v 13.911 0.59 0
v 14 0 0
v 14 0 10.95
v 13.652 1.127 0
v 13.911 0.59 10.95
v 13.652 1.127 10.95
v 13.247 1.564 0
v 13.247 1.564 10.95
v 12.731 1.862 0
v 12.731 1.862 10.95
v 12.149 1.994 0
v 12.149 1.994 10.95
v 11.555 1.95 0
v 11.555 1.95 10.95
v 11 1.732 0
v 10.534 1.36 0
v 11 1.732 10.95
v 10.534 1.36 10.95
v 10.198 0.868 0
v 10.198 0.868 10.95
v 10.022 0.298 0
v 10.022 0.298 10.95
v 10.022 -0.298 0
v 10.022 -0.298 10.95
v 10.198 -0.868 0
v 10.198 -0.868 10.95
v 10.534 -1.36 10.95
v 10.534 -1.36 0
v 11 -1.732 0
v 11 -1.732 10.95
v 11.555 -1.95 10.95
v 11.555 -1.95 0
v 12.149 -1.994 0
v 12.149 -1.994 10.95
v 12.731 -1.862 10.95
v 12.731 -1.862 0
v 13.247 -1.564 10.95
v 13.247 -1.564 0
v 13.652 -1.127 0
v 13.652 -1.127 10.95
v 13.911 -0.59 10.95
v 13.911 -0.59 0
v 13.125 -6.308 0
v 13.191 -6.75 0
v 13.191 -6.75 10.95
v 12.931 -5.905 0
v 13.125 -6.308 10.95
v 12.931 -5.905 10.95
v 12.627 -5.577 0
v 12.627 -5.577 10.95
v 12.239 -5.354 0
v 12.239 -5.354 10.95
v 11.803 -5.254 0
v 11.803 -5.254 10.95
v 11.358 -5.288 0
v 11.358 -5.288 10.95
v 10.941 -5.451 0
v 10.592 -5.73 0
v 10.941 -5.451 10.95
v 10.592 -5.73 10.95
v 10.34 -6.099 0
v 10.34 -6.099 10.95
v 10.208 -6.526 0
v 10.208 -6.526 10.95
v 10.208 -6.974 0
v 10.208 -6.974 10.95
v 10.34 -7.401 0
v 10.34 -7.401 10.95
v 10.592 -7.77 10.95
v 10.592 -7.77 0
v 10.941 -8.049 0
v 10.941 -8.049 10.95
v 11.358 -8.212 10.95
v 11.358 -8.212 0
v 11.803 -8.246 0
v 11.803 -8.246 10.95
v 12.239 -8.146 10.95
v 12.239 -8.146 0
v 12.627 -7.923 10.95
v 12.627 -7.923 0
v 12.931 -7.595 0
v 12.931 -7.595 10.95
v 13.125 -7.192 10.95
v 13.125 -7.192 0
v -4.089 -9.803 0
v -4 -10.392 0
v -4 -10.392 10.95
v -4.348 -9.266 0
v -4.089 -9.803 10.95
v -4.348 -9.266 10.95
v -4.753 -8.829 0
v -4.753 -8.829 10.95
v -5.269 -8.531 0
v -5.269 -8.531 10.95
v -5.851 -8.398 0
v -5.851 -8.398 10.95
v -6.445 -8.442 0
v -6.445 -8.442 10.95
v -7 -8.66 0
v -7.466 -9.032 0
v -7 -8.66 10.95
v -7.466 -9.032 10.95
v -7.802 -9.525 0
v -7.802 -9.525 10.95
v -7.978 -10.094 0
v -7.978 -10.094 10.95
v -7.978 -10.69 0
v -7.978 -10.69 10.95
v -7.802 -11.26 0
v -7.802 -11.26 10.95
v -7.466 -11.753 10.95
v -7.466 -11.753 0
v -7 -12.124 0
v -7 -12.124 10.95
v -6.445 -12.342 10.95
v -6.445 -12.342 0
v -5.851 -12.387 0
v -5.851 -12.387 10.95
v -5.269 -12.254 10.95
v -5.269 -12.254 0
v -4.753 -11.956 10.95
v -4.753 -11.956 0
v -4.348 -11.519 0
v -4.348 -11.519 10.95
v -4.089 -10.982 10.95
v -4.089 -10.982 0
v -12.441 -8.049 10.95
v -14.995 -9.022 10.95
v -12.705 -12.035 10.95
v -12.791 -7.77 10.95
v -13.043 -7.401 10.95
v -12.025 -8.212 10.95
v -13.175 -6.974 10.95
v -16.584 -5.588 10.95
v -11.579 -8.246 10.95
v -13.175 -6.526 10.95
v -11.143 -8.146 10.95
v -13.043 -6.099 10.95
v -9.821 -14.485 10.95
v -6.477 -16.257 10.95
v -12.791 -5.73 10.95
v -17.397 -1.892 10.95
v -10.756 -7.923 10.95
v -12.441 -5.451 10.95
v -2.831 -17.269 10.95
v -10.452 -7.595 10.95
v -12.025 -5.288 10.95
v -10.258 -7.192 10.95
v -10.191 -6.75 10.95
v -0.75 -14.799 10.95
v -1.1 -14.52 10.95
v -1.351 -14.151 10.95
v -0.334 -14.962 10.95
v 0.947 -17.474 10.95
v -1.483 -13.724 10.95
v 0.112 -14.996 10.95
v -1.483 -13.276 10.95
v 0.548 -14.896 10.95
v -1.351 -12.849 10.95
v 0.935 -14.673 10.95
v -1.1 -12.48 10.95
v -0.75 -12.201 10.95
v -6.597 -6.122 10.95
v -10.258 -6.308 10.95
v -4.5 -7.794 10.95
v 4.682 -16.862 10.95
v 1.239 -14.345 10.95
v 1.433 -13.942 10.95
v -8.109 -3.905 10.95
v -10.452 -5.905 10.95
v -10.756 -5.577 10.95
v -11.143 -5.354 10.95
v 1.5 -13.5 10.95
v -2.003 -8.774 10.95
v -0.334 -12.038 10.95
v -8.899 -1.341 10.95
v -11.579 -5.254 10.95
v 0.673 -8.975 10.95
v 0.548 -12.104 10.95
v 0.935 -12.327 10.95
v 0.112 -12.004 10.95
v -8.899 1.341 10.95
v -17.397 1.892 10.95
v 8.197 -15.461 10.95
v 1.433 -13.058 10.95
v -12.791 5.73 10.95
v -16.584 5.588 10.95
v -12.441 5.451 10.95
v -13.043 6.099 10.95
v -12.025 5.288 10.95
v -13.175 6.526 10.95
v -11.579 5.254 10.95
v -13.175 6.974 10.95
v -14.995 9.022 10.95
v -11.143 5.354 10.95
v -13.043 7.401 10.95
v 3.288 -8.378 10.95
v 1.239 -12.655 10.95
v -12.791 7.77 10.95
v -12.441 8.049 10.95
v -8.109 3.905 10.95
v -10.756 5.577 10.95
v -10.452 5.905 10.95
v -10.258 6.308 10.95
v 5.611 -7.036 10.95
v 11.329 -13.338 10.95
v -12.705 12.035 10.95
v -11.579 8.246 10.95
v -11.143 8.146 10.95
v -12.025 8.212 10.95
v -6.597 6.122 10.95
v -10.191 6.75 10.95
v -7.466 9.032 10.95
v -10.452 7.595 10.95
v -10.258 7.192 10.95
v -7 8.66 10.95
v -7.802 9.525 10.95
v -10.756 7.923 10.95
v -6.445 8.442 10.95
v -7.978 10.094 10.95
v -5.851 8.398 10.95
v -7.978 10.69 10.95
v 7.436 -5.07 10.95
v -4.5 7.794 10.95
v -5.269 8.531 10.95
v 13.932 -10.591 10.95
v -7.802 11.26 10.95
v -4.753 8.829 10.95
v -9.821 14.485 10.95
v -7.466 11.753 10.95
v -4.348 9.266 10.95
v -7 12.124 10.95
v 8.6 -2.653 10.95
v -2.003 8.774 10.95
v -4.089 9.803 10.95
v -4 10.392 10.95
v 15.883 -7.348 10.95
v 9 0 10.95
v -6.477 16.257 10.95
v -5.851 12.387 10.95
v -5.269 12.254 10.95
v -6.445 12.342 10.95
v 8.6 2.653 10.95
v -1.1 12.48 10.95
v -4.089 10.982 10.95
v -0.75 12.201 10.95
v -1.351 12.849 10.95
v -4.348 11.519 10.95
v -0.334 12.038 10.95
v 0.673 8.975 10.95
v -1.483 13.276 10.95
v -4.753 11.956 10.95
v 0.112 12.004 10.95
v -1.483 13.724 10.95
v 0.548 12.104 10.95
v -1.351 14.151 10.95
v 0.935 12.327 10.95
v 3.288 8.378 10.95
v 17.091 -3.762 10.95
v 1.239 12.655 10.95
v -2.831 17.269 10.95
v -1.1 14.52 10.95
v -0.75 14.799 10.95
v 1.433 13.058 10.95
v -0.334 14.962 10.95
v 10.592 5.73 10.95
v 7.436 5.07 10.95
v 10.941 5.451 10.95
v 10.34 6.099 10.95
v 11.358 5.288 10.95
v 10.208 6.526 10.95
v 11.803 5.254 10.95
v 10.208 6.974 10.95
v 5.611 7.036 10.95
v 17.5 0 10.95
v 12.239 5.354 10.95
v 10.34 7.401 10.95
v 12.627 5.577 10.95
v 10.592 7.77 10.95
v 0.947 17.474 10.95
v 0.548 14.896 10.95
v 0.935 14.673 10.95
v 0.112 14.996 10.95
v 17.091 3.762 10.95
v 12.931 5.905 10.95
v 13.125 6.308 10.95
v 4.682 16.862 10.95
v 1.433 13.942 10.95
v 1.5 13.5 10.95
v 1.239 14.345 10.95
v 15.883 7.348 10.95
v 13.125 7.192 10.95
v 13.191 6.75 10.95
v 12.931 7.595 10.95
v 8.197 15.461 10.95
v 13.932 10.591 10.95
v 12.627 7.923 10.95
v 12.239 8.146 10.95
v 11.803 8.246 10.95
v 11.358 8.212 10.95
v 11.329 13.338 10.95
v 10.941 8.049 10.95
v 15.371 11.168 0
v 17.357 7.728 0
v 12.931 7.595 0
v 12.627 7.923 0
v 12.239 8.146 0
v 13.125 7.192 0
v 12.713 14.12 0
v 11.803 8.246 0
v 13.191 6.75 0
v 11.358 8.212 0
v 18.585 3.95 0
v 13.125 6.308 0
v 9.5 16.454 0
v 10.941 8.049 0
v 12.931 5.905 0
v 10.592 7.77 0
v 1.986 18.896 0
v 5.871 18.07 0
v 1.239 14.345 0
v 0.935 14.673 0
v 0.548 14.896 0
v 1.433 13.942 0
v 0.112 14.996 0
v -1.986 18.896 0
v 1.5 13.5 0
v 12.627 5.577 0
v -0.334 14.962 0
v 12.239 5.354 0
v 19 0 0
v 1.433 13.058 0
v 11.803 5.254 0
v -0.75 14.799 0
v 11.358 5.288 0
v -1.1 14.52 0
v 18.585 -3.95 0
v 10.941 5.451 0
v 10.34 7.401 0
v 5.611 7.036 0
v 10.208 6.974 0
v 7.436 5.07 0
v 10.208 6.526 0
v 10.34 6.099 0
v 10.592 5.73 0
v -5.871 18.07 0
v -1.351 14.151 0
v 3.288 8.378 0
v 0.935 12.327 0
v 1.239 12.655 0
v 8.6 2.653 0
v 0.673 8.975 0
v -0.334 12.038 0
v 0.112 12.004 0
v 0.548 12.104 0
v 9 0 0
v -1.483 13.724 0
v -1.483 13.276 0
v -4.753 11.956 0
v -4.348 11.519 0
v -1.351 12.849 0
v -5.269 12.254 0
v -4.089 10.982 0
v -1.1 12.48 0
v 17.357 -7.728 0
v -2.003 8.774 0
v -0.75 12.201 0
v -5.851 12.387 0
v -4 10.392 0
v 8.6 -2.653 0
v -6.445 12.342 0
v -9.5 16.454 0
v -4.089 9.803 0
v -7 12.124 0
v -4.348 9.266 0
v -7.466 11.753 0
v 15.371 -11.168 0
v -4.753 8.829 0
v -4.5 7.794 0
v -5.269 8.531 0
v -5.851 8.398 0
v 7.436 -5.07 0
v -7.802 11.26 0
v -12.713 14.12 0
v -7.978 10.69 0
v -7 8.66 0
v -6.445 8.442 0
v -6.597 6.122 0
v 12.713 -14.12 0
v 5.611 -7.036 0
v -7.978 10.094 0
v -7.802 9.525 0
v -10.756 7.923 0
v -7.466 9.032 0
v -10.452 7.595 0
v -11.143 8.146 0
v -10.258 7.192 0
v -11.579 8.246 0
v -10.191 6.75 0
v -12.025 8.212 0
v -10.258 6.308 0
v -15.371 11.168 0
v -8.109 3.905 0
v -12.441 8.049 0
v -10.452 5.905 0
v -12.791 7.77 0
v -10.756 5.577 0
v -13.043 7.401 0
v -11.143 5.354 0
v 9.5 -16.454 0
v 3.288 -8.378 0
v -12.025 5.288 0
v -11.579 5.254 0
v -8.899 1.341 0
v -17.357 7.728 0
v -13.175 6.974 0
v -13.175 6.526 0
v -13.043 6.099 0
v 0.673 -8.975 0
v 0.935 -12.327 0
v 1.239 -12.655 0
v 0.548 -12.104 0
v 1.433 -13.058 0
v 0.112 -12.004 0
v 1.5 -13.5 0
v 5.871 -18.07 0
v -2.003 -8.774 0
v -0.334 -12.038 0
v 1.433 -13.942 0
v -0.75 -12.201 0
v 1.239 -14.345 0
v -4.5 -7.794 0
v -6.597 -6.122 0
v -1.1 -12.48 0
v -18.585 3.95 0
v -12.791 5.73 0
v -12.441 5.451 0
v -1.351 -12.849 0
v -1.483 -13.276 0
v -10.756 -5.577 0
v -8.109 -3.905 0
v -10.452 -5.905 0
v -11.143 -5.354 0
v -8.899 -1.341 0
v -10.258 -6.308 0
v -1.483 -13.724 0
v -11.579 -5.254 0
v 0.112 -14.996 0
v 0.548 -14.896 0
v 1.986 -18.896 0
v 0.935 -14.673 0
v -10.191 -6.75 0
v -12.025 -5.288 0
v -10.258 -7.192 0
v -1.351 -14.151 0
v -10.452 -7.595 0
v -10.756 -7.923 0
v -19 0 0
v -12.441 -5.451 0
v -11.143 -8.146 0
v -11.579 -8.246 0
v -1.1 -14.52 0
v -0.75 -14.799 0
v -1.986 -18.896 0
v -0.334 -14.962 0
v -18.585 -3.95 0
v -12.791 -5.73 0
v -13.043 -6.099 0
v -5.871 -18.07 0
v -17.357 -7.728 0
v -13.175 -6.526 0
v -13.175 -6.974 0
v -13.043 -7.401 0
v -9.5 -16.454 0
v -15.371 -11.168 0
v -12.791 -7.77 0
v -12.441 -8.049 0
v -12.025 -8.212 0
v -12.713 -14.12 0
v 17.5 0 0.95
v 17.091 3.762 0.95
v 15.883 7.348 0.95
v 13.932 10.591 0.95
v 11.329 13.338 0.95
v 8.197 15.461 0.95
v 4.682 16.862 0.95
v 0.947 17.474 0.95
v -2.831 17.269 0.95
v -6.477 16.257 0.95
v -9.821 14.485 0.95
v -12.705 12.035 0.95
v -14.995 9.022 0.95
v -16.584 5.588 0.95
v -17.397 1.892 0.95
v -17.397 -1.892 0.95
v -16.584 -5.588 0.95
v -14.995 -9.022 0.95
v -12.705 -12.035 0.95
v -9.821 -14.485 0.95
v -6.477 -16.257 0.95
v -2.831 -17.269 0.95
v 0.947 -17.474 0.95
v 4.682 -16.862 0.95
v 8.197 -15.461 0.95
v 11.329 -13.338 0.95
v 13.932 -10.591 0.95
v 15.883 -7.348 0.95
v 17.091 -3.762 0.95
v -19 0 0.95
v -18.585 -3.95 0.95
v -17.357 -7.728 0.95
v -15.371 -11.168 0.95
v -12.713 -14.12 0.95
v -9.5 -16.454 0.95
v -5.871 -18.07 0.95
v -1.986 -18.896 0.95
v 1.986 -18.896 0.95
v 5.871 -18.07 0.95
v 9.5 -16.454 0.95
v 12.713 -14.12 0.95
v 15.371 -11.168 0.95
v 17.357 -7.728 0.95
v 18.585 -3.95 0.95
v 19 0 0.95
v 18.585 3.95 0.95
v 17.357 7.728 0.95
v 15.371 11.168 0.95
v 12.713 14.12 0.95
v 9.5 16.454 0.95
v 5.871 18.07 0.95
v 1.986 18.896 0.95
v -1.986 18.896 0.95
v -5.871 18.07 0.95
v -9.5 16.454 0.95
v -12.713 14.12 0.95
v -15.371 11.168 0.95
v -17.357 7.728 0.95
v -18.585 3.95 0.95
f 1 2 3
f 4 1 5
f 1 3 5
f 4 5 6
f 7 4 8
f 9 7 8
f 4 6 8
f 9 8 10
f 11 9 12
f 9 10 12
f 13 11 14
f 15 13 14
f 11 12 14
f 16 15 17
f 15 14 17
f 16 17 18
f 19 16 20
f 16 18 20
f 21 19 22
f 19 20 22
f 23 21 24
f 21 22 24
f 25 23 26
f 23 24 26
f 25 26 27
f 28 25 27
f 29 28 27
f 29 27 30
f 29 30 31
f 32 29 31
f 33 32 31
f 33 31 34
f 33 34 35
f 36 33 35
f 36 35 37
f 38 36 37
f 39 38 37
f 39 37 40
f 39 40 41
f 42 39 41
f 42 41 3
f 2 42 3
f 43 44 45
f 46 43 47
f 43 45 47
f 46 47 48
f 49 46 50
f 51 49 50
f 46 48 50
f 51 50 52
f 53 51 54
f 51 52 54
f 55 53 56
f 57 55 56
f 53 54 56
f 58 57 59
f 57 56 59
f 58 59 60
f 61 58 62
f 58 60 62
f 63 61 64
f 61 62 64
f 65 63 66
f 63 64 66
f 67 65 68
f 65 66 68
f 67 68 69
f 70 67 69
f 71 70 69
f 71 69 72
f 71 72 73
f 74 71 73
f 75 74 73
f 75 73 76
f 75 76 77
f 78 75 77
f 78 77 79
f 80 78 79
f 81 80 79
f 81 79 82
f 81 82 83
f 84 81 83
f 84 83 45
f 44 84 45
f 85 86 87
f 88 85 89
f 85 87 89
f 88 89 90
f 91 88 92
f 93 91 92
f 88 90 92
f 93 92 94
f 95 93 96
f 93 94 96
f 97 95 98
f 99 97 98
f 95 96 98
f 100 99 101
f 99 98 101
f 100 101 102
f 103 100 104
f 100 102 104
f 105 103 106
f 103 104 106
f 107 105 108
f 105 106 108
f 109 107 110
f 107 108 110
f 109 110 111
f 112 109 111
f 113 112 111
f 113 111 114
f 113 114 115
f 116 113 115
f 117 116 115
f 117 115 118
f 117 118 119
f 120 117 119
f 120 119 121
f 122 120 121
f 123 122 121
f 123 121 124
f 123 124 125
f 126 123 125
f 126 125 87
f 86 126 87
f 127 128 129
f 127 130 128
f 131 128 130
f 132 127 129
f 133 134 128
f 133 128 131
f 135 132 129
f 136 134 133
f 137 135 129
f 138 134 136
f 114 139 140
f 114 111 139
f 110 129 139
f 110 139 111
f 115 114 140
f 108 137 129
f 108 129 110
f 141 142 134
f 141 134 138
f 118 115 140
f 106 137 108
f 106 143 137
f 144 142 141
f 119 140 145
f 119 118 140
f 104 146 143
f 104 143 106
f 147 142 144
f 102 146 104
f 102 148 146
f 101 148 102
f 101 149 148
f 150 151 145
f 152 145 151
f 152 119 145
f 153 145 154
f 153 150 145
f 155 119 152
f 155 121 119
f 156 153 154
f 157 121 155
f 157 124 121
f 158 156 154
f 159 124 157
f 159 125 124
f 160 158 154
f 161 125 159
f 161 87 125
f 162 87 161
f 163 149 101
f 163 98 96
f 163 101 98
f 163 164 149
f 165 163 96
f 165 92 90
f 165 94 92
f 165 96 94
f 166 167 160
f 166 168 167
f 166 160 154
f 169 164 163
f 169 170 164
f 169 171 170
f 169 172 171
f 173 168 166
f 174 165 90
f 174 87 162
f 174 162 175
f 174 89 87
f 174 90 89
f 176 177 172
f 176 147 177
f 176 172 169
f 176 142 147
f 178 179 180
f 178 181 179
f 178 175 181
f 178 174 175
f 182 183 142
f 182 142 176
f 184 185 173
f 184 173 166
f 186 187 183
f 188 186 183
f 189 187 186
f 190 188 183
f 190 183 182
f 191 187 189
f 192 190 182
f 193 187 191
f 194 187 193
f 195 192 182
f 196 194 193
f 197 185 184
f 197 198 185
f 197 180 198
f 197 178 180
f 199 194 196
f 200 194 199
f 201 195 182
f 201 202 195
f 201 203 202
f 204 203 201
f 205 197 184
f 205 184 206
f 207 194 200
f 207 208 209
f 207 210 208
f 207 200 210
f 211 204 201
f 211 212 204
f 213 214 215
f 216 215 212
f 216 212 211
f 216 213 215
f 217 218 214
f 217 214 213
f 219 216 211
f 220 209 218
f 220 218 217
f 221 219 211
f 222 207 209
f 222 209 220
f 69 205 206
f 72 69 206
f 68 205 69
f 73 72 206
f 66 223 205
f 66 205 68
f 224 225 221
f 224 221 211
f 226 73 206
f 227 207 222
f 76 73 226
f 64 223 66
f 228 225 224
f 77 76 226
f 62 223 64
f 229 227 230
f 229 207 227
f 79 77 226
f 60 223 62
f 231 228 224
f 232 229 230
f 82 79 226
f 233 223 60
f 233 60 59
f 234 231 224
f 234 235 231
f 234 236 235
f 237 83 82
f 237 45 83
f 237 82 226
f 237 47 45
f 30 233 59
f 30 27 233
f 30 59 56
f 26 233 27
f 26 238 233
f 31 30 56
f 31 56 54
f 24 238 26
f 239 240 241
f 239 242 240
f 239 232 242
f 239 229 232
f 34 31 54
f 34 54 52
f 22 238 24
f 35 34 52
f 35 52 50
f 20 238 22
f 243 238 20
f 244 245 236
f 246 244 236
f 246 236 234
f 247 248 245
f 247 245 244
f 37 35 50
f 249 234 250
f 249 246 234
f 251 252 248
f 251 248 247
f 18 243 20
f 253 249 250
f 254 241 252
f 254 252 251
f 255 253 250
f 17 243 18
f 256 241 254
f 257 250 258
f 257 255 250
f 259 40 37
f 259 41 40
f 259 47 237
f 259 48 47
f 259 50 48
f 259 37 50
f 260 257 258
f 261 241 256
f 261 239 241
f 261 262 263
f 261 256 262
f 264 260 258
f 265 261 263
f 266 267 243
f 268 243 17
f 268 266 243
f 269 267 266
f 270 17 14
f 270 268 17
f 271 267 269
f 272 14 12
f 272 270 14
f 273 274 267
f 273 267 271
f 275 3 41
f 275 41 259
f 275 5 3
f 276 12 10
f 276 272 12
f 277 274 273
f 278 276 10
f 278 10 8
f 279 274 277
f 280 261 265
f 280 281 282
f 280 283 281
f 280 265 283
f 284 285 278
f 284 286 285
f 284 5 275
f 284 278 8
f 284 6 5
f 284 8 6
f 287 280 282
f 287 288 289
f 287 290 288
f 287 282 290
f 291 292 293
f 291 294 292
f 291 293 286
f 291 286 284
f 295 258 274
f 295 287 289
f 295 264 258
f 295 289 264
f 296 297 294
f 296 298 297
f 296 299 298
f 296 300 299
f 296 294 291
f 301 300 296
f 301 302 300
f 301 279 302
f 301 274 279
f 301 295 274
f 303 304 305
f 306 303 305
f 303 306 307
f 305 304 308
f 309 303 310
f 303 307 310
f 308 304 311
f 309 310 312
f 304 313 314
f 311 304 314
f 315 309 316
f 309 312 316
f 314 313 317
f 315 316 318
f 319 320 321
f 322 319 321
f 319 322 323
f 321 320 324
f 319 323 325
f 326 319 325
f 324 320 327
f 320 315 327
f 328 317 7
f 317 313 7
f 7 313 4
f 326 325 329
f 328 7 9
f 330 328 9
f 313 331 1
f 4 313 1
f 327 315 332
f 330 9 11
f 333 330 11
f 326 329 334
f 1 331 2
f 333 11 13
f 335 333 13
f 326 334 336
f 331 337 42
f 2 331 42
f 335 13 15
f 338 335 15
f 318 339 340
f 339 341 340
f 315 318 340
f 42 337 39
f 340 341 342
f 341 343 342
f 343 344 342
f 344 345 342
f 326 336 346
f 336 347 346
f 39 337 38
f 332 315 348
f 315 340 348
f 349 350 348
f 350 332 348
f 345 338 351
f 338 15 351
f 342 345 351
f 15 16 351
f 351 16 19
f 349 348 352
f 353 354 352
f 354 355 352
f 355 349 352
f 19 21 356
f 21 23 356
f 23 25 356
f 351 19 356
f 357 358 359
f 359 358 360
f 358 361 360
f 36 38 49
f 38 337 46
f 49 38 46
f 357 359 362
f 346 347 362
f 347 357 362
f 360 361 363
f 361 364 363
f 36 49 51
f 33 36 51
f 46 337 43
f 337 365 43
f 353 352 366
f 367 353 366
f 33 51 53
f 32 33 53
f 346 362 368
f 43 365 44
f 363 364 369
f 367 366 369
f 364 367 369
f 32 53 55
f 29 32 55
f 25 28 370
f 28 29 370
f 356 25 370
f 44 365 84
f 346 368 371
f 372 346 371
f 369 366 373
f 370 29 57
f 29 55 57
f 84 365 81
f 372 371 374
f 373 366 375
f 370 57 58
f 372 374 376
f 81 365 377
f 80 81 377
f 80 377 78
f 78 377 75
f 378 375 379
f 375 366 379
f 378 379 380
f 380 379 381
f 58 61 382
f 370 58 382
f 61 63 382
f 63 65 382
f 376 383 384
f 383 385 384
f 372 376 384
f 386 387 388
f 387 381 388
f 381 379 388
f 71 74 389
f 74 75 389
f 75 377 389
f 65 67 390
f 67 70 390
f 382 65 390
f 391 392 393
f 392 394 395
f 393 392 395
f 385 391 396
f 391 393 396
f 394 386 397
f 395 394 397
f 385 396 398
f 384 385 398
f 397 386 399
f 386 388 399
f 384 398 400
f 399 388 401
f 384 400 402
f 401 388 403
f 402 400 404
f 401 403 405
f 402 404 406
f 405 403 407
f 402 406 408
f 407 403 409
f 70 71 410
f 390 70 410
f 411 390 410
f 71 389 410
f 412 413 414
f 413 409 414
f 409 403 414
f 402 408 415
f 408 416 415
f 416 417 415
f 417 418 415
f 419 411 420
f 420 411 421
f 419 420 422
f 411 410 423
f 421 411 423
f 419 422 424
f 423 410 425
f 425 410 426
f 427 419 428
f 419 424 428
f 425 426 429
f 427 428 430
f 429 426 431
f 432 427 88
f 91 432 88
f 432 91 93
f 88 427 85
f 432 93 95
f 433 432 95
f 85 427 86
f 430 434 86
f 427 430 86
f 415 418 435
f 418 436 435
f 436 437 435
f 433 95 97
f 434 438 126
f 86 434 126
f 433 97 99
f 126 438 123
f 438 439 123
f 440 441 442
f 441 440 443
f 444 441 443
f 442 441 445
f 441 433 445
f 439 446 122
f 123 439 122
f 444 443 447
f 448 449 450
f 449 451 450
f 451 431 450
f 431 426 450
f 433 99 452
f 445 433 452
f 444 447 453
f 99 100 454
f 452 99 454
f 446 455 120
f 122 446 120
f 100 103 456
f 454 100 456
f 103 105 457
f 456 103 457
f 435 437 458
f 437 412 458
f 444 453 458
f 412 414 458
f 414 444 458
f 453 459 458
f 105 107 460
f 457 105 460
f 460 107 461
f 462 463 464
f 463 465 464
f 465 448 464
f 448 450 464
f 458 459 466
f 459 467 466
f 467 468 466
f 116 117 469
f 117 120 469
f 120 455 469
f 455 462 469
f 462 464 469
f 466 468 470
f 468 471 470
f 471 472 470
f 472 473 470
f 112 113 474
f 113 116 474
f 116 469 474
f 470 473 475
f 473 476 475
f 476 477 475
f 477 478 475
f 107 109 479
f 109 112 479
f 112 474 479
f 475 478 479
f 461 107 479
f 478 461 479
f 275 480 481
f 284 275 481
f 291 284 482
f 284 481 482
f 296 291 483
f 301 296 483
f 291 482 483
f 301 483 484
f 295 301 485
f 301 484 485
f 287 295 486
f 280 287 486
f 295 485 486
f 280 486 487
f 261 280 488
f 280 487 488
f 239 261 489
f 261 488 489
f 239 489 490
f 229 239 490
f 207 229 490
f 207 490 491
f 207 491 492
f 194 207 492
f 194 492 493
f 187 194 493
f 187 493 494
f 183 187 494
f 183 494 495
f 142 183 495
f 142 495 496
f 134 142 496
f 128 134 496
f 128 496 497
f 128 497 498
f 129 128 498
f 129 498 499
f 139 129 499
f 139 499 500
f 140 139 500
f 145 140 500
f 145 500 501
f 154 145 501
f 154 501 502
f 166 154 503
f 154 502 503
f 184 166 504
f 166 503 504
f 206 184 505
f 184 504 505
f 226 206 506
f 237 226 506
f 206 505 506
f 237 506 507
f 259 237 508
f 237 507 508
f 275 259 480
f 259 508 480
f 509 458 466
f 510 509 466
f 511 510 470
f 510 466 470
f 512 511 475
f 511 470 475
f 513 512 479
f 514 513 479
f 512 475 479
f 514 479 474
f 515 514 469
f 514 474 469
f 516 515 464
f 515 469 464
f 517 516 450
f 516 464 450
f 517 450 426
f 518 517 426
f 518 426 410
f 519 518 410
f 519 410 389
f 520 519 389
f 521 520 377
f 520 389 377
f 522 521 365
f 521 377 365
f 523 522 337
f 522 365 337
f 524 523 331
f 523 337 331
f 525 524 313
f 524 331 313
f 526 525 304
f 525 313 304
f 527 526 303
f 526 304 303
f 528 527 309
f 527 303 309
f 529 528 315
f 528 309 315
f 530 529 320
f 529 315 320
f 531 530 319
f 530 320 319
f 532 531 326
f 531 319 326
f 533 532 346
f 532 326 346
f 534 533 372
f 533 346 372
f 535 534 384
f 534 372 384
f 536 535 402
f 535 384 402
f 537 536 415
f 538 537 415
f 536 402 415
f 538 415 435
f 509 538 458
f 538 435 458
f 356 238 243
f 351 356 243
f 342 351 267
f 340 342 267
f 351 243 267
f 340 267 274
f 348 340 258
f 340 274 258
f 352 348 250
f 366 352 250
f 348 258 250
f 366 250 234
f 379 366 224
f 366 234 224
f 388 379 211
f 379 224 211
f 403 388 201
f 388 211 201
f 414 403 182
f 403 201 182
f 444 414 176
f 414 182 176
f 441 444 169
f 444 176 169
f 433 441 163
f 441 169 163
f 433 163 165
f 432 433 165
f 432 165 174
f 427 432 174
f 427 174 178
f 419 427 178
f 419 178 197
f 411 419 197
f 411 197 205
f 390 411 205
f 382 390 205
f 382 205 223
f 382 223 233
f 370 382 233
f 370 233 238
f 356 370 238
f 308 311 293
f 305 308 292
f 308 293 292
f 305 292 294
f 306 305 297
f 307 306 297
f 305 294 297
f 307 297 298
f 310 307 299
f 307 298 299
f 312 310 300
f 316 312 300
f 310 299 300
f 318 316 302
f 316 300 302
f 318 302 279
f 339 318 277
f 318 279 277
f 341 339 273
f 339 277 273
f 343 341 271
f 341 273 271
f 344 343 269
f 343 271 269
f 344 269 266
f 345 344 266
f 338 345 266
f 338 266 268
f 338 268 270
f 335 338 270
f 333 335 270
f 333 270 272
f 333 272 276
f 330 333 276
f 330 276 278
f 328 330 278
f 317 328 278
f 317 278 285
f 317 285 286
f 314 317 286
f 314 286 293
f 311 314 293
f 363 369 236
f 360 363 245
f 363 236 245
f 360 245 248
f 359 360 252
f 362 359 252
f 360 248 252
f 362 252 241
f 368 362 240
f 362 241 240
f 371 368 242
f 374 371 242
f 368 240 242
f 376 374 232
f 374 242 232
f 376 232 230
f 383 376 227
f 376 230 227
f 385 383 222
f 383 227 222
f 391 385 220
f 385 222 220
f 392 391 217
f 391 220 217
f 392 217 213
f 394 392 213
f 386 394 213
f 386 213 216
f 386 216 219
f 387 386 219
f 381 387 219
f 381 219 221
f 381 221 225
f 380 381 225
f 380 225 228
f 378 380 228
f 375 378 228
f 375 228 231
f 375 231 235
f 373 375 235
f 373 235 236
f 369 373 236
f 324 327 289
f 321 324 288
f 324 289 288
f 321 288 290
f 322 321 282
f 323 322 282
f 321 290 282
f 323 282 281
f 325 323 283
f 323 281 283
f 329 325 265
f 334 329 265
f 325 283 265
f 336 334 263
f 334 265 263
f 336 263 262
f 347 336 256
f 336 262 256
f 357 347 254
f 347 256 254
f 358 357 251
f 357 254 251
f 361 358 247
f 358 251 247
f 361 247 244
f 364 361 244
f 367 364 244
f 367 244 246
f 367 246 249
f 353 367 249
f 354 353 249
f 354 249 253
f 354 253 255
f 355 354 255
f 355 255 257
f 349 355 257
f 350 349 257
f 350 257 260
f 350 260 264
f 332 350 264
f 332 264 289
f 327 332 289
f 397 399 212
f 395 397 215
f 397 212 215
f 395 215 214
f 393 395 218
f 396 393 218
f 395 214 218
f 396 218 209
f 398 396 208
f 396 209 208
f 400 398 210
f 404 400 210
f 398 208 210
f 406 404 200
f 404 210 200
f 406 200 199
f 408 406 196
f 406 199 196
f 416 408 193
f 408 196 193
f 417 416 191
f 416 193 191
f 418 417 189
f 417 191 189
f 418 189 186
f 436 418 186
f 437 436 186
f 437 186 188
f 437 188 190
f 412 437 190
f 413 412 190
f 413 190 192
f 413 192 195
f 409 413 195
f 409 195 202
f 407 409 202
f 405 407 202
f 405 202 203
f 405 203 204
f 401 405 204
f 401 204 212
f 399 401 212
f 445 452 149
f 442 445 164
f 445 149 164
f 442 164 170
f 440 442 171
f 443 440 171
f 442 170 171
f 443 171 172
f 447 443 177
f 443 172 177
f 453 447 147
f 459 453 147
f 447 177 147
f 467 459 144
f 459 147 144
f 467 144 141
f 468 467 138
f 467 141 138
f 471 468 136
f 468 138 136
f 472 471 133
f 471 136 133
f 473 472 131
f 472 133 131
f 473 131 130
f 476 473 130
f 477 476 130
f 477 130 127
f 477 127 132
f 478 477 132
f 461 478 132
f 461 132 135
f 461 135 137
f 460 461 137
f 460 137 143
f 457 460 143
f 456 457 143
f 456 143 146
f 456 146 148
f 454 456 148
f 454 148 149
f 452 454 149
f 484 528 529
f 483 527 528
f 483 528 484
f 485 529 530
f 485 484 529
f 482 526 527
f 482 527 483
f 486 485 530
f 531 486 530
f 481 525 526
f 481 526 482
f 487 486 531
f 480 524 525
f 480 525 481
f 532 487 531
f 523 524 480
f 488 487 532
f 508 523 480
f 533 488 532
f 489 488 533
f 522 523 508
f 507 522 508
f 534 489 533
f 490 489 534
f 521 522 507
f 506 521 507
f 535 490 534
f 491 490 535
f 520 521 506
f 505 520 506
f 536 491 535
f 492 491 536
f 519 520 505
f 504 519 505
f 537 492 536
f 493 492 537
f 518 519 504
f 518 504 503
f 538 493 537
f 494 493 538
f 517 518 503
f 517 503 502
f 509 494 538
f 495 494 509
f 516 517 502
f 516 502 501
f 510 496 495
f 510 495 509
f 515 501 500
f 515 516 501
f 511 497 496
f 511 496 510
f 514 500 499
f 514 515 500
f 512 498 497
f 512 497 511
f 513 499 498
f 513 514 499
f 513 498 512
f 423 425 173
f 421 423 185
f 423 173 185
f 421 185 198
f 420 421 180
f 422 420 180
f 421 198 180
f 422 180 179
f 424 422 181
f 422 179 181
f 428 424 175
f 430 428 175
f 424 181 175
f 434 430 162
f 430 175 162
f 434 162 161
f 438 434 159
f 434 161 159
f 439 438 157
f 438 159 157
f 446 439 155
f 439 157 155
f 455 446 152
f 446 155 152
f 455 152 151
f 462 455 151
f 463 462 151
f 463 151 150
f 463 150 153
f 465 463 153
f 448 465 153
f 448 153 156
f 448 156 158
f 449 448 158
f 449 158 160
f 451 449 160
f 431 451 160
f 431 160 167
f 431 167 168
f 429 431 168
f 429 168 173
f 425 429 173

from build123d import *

# Parameters (mm, degrees)
SKETCH_1_R          = 17.5
EXTRUDE_1_DEPTH     = 10.95
SKETCH_1_4_R        = 19
SKETCH_1_4_R_2      = 17.5
EXTRUDE_2_DEPTH     = 0.95
SKETCH_2_R          = 9
SKETCH_2_R_2        = 1.5
SKETCH_2_R_3        = 2
CUT_EXTRUDE_1_DEPTH = 30.015556173


with BuildPart() as part:
    # 草图1 → 凸台-拉伸1 (new body)
    with BuildSketch(Plane.XY):
        Circle(SKETCH_1_R)
    extrude(amount=EXTRUDE_1_DEPTH)

    # 草图1<4> → 凸台-拉伸2 (add)
    with BuildSketch(Plane.XY):
        Circle(SKETCH_1_4_R)
        Circle(SKETCH_1_4_R_2, mode=Mode.SUBTRACT)
    extrude(amount=EXTRUDE_2_DEPTH)

    # 草图2 → 切除-拉伸1 (cut, through all)
    with BuildSketch(Plane.XY.offset(10.95)):
        Circle(SKETCH_2_R)
        with Locations((0, 13.5)):
            Circle(SKETCH_2_R_2)
        with Locations((11.691342951, 6.75)):
            Circle(SKETCH_2_R_2)
        with Locations((11.691342951, -6.75)):
            Circle(SKETCH_2_R_2)
        with Locations((0, -13.5)):
            Circle(SKETCH_2_R_2)
        with Locations((-11.691342951, -6.75)):
            Circle(SKETCH_2_R_2)
        with Locations((-11.691342951, 6.75)):
            Circle(SKETCH_2_R_2)
        with Locations((12, 0)):
            Circle(SKETCH_2_R_3)
        with Locations((-6, -10.392304845)):
            Circle(SKETCH_2_R_3)
        with Locations((-6, 10.392304845)):
            Circle(SKETCH_2_R_3)
    extrude(amount=-CUT_EXTRUDE_1_DEPTH, mode=Mode.SUBTRACT)


solid = part.part
